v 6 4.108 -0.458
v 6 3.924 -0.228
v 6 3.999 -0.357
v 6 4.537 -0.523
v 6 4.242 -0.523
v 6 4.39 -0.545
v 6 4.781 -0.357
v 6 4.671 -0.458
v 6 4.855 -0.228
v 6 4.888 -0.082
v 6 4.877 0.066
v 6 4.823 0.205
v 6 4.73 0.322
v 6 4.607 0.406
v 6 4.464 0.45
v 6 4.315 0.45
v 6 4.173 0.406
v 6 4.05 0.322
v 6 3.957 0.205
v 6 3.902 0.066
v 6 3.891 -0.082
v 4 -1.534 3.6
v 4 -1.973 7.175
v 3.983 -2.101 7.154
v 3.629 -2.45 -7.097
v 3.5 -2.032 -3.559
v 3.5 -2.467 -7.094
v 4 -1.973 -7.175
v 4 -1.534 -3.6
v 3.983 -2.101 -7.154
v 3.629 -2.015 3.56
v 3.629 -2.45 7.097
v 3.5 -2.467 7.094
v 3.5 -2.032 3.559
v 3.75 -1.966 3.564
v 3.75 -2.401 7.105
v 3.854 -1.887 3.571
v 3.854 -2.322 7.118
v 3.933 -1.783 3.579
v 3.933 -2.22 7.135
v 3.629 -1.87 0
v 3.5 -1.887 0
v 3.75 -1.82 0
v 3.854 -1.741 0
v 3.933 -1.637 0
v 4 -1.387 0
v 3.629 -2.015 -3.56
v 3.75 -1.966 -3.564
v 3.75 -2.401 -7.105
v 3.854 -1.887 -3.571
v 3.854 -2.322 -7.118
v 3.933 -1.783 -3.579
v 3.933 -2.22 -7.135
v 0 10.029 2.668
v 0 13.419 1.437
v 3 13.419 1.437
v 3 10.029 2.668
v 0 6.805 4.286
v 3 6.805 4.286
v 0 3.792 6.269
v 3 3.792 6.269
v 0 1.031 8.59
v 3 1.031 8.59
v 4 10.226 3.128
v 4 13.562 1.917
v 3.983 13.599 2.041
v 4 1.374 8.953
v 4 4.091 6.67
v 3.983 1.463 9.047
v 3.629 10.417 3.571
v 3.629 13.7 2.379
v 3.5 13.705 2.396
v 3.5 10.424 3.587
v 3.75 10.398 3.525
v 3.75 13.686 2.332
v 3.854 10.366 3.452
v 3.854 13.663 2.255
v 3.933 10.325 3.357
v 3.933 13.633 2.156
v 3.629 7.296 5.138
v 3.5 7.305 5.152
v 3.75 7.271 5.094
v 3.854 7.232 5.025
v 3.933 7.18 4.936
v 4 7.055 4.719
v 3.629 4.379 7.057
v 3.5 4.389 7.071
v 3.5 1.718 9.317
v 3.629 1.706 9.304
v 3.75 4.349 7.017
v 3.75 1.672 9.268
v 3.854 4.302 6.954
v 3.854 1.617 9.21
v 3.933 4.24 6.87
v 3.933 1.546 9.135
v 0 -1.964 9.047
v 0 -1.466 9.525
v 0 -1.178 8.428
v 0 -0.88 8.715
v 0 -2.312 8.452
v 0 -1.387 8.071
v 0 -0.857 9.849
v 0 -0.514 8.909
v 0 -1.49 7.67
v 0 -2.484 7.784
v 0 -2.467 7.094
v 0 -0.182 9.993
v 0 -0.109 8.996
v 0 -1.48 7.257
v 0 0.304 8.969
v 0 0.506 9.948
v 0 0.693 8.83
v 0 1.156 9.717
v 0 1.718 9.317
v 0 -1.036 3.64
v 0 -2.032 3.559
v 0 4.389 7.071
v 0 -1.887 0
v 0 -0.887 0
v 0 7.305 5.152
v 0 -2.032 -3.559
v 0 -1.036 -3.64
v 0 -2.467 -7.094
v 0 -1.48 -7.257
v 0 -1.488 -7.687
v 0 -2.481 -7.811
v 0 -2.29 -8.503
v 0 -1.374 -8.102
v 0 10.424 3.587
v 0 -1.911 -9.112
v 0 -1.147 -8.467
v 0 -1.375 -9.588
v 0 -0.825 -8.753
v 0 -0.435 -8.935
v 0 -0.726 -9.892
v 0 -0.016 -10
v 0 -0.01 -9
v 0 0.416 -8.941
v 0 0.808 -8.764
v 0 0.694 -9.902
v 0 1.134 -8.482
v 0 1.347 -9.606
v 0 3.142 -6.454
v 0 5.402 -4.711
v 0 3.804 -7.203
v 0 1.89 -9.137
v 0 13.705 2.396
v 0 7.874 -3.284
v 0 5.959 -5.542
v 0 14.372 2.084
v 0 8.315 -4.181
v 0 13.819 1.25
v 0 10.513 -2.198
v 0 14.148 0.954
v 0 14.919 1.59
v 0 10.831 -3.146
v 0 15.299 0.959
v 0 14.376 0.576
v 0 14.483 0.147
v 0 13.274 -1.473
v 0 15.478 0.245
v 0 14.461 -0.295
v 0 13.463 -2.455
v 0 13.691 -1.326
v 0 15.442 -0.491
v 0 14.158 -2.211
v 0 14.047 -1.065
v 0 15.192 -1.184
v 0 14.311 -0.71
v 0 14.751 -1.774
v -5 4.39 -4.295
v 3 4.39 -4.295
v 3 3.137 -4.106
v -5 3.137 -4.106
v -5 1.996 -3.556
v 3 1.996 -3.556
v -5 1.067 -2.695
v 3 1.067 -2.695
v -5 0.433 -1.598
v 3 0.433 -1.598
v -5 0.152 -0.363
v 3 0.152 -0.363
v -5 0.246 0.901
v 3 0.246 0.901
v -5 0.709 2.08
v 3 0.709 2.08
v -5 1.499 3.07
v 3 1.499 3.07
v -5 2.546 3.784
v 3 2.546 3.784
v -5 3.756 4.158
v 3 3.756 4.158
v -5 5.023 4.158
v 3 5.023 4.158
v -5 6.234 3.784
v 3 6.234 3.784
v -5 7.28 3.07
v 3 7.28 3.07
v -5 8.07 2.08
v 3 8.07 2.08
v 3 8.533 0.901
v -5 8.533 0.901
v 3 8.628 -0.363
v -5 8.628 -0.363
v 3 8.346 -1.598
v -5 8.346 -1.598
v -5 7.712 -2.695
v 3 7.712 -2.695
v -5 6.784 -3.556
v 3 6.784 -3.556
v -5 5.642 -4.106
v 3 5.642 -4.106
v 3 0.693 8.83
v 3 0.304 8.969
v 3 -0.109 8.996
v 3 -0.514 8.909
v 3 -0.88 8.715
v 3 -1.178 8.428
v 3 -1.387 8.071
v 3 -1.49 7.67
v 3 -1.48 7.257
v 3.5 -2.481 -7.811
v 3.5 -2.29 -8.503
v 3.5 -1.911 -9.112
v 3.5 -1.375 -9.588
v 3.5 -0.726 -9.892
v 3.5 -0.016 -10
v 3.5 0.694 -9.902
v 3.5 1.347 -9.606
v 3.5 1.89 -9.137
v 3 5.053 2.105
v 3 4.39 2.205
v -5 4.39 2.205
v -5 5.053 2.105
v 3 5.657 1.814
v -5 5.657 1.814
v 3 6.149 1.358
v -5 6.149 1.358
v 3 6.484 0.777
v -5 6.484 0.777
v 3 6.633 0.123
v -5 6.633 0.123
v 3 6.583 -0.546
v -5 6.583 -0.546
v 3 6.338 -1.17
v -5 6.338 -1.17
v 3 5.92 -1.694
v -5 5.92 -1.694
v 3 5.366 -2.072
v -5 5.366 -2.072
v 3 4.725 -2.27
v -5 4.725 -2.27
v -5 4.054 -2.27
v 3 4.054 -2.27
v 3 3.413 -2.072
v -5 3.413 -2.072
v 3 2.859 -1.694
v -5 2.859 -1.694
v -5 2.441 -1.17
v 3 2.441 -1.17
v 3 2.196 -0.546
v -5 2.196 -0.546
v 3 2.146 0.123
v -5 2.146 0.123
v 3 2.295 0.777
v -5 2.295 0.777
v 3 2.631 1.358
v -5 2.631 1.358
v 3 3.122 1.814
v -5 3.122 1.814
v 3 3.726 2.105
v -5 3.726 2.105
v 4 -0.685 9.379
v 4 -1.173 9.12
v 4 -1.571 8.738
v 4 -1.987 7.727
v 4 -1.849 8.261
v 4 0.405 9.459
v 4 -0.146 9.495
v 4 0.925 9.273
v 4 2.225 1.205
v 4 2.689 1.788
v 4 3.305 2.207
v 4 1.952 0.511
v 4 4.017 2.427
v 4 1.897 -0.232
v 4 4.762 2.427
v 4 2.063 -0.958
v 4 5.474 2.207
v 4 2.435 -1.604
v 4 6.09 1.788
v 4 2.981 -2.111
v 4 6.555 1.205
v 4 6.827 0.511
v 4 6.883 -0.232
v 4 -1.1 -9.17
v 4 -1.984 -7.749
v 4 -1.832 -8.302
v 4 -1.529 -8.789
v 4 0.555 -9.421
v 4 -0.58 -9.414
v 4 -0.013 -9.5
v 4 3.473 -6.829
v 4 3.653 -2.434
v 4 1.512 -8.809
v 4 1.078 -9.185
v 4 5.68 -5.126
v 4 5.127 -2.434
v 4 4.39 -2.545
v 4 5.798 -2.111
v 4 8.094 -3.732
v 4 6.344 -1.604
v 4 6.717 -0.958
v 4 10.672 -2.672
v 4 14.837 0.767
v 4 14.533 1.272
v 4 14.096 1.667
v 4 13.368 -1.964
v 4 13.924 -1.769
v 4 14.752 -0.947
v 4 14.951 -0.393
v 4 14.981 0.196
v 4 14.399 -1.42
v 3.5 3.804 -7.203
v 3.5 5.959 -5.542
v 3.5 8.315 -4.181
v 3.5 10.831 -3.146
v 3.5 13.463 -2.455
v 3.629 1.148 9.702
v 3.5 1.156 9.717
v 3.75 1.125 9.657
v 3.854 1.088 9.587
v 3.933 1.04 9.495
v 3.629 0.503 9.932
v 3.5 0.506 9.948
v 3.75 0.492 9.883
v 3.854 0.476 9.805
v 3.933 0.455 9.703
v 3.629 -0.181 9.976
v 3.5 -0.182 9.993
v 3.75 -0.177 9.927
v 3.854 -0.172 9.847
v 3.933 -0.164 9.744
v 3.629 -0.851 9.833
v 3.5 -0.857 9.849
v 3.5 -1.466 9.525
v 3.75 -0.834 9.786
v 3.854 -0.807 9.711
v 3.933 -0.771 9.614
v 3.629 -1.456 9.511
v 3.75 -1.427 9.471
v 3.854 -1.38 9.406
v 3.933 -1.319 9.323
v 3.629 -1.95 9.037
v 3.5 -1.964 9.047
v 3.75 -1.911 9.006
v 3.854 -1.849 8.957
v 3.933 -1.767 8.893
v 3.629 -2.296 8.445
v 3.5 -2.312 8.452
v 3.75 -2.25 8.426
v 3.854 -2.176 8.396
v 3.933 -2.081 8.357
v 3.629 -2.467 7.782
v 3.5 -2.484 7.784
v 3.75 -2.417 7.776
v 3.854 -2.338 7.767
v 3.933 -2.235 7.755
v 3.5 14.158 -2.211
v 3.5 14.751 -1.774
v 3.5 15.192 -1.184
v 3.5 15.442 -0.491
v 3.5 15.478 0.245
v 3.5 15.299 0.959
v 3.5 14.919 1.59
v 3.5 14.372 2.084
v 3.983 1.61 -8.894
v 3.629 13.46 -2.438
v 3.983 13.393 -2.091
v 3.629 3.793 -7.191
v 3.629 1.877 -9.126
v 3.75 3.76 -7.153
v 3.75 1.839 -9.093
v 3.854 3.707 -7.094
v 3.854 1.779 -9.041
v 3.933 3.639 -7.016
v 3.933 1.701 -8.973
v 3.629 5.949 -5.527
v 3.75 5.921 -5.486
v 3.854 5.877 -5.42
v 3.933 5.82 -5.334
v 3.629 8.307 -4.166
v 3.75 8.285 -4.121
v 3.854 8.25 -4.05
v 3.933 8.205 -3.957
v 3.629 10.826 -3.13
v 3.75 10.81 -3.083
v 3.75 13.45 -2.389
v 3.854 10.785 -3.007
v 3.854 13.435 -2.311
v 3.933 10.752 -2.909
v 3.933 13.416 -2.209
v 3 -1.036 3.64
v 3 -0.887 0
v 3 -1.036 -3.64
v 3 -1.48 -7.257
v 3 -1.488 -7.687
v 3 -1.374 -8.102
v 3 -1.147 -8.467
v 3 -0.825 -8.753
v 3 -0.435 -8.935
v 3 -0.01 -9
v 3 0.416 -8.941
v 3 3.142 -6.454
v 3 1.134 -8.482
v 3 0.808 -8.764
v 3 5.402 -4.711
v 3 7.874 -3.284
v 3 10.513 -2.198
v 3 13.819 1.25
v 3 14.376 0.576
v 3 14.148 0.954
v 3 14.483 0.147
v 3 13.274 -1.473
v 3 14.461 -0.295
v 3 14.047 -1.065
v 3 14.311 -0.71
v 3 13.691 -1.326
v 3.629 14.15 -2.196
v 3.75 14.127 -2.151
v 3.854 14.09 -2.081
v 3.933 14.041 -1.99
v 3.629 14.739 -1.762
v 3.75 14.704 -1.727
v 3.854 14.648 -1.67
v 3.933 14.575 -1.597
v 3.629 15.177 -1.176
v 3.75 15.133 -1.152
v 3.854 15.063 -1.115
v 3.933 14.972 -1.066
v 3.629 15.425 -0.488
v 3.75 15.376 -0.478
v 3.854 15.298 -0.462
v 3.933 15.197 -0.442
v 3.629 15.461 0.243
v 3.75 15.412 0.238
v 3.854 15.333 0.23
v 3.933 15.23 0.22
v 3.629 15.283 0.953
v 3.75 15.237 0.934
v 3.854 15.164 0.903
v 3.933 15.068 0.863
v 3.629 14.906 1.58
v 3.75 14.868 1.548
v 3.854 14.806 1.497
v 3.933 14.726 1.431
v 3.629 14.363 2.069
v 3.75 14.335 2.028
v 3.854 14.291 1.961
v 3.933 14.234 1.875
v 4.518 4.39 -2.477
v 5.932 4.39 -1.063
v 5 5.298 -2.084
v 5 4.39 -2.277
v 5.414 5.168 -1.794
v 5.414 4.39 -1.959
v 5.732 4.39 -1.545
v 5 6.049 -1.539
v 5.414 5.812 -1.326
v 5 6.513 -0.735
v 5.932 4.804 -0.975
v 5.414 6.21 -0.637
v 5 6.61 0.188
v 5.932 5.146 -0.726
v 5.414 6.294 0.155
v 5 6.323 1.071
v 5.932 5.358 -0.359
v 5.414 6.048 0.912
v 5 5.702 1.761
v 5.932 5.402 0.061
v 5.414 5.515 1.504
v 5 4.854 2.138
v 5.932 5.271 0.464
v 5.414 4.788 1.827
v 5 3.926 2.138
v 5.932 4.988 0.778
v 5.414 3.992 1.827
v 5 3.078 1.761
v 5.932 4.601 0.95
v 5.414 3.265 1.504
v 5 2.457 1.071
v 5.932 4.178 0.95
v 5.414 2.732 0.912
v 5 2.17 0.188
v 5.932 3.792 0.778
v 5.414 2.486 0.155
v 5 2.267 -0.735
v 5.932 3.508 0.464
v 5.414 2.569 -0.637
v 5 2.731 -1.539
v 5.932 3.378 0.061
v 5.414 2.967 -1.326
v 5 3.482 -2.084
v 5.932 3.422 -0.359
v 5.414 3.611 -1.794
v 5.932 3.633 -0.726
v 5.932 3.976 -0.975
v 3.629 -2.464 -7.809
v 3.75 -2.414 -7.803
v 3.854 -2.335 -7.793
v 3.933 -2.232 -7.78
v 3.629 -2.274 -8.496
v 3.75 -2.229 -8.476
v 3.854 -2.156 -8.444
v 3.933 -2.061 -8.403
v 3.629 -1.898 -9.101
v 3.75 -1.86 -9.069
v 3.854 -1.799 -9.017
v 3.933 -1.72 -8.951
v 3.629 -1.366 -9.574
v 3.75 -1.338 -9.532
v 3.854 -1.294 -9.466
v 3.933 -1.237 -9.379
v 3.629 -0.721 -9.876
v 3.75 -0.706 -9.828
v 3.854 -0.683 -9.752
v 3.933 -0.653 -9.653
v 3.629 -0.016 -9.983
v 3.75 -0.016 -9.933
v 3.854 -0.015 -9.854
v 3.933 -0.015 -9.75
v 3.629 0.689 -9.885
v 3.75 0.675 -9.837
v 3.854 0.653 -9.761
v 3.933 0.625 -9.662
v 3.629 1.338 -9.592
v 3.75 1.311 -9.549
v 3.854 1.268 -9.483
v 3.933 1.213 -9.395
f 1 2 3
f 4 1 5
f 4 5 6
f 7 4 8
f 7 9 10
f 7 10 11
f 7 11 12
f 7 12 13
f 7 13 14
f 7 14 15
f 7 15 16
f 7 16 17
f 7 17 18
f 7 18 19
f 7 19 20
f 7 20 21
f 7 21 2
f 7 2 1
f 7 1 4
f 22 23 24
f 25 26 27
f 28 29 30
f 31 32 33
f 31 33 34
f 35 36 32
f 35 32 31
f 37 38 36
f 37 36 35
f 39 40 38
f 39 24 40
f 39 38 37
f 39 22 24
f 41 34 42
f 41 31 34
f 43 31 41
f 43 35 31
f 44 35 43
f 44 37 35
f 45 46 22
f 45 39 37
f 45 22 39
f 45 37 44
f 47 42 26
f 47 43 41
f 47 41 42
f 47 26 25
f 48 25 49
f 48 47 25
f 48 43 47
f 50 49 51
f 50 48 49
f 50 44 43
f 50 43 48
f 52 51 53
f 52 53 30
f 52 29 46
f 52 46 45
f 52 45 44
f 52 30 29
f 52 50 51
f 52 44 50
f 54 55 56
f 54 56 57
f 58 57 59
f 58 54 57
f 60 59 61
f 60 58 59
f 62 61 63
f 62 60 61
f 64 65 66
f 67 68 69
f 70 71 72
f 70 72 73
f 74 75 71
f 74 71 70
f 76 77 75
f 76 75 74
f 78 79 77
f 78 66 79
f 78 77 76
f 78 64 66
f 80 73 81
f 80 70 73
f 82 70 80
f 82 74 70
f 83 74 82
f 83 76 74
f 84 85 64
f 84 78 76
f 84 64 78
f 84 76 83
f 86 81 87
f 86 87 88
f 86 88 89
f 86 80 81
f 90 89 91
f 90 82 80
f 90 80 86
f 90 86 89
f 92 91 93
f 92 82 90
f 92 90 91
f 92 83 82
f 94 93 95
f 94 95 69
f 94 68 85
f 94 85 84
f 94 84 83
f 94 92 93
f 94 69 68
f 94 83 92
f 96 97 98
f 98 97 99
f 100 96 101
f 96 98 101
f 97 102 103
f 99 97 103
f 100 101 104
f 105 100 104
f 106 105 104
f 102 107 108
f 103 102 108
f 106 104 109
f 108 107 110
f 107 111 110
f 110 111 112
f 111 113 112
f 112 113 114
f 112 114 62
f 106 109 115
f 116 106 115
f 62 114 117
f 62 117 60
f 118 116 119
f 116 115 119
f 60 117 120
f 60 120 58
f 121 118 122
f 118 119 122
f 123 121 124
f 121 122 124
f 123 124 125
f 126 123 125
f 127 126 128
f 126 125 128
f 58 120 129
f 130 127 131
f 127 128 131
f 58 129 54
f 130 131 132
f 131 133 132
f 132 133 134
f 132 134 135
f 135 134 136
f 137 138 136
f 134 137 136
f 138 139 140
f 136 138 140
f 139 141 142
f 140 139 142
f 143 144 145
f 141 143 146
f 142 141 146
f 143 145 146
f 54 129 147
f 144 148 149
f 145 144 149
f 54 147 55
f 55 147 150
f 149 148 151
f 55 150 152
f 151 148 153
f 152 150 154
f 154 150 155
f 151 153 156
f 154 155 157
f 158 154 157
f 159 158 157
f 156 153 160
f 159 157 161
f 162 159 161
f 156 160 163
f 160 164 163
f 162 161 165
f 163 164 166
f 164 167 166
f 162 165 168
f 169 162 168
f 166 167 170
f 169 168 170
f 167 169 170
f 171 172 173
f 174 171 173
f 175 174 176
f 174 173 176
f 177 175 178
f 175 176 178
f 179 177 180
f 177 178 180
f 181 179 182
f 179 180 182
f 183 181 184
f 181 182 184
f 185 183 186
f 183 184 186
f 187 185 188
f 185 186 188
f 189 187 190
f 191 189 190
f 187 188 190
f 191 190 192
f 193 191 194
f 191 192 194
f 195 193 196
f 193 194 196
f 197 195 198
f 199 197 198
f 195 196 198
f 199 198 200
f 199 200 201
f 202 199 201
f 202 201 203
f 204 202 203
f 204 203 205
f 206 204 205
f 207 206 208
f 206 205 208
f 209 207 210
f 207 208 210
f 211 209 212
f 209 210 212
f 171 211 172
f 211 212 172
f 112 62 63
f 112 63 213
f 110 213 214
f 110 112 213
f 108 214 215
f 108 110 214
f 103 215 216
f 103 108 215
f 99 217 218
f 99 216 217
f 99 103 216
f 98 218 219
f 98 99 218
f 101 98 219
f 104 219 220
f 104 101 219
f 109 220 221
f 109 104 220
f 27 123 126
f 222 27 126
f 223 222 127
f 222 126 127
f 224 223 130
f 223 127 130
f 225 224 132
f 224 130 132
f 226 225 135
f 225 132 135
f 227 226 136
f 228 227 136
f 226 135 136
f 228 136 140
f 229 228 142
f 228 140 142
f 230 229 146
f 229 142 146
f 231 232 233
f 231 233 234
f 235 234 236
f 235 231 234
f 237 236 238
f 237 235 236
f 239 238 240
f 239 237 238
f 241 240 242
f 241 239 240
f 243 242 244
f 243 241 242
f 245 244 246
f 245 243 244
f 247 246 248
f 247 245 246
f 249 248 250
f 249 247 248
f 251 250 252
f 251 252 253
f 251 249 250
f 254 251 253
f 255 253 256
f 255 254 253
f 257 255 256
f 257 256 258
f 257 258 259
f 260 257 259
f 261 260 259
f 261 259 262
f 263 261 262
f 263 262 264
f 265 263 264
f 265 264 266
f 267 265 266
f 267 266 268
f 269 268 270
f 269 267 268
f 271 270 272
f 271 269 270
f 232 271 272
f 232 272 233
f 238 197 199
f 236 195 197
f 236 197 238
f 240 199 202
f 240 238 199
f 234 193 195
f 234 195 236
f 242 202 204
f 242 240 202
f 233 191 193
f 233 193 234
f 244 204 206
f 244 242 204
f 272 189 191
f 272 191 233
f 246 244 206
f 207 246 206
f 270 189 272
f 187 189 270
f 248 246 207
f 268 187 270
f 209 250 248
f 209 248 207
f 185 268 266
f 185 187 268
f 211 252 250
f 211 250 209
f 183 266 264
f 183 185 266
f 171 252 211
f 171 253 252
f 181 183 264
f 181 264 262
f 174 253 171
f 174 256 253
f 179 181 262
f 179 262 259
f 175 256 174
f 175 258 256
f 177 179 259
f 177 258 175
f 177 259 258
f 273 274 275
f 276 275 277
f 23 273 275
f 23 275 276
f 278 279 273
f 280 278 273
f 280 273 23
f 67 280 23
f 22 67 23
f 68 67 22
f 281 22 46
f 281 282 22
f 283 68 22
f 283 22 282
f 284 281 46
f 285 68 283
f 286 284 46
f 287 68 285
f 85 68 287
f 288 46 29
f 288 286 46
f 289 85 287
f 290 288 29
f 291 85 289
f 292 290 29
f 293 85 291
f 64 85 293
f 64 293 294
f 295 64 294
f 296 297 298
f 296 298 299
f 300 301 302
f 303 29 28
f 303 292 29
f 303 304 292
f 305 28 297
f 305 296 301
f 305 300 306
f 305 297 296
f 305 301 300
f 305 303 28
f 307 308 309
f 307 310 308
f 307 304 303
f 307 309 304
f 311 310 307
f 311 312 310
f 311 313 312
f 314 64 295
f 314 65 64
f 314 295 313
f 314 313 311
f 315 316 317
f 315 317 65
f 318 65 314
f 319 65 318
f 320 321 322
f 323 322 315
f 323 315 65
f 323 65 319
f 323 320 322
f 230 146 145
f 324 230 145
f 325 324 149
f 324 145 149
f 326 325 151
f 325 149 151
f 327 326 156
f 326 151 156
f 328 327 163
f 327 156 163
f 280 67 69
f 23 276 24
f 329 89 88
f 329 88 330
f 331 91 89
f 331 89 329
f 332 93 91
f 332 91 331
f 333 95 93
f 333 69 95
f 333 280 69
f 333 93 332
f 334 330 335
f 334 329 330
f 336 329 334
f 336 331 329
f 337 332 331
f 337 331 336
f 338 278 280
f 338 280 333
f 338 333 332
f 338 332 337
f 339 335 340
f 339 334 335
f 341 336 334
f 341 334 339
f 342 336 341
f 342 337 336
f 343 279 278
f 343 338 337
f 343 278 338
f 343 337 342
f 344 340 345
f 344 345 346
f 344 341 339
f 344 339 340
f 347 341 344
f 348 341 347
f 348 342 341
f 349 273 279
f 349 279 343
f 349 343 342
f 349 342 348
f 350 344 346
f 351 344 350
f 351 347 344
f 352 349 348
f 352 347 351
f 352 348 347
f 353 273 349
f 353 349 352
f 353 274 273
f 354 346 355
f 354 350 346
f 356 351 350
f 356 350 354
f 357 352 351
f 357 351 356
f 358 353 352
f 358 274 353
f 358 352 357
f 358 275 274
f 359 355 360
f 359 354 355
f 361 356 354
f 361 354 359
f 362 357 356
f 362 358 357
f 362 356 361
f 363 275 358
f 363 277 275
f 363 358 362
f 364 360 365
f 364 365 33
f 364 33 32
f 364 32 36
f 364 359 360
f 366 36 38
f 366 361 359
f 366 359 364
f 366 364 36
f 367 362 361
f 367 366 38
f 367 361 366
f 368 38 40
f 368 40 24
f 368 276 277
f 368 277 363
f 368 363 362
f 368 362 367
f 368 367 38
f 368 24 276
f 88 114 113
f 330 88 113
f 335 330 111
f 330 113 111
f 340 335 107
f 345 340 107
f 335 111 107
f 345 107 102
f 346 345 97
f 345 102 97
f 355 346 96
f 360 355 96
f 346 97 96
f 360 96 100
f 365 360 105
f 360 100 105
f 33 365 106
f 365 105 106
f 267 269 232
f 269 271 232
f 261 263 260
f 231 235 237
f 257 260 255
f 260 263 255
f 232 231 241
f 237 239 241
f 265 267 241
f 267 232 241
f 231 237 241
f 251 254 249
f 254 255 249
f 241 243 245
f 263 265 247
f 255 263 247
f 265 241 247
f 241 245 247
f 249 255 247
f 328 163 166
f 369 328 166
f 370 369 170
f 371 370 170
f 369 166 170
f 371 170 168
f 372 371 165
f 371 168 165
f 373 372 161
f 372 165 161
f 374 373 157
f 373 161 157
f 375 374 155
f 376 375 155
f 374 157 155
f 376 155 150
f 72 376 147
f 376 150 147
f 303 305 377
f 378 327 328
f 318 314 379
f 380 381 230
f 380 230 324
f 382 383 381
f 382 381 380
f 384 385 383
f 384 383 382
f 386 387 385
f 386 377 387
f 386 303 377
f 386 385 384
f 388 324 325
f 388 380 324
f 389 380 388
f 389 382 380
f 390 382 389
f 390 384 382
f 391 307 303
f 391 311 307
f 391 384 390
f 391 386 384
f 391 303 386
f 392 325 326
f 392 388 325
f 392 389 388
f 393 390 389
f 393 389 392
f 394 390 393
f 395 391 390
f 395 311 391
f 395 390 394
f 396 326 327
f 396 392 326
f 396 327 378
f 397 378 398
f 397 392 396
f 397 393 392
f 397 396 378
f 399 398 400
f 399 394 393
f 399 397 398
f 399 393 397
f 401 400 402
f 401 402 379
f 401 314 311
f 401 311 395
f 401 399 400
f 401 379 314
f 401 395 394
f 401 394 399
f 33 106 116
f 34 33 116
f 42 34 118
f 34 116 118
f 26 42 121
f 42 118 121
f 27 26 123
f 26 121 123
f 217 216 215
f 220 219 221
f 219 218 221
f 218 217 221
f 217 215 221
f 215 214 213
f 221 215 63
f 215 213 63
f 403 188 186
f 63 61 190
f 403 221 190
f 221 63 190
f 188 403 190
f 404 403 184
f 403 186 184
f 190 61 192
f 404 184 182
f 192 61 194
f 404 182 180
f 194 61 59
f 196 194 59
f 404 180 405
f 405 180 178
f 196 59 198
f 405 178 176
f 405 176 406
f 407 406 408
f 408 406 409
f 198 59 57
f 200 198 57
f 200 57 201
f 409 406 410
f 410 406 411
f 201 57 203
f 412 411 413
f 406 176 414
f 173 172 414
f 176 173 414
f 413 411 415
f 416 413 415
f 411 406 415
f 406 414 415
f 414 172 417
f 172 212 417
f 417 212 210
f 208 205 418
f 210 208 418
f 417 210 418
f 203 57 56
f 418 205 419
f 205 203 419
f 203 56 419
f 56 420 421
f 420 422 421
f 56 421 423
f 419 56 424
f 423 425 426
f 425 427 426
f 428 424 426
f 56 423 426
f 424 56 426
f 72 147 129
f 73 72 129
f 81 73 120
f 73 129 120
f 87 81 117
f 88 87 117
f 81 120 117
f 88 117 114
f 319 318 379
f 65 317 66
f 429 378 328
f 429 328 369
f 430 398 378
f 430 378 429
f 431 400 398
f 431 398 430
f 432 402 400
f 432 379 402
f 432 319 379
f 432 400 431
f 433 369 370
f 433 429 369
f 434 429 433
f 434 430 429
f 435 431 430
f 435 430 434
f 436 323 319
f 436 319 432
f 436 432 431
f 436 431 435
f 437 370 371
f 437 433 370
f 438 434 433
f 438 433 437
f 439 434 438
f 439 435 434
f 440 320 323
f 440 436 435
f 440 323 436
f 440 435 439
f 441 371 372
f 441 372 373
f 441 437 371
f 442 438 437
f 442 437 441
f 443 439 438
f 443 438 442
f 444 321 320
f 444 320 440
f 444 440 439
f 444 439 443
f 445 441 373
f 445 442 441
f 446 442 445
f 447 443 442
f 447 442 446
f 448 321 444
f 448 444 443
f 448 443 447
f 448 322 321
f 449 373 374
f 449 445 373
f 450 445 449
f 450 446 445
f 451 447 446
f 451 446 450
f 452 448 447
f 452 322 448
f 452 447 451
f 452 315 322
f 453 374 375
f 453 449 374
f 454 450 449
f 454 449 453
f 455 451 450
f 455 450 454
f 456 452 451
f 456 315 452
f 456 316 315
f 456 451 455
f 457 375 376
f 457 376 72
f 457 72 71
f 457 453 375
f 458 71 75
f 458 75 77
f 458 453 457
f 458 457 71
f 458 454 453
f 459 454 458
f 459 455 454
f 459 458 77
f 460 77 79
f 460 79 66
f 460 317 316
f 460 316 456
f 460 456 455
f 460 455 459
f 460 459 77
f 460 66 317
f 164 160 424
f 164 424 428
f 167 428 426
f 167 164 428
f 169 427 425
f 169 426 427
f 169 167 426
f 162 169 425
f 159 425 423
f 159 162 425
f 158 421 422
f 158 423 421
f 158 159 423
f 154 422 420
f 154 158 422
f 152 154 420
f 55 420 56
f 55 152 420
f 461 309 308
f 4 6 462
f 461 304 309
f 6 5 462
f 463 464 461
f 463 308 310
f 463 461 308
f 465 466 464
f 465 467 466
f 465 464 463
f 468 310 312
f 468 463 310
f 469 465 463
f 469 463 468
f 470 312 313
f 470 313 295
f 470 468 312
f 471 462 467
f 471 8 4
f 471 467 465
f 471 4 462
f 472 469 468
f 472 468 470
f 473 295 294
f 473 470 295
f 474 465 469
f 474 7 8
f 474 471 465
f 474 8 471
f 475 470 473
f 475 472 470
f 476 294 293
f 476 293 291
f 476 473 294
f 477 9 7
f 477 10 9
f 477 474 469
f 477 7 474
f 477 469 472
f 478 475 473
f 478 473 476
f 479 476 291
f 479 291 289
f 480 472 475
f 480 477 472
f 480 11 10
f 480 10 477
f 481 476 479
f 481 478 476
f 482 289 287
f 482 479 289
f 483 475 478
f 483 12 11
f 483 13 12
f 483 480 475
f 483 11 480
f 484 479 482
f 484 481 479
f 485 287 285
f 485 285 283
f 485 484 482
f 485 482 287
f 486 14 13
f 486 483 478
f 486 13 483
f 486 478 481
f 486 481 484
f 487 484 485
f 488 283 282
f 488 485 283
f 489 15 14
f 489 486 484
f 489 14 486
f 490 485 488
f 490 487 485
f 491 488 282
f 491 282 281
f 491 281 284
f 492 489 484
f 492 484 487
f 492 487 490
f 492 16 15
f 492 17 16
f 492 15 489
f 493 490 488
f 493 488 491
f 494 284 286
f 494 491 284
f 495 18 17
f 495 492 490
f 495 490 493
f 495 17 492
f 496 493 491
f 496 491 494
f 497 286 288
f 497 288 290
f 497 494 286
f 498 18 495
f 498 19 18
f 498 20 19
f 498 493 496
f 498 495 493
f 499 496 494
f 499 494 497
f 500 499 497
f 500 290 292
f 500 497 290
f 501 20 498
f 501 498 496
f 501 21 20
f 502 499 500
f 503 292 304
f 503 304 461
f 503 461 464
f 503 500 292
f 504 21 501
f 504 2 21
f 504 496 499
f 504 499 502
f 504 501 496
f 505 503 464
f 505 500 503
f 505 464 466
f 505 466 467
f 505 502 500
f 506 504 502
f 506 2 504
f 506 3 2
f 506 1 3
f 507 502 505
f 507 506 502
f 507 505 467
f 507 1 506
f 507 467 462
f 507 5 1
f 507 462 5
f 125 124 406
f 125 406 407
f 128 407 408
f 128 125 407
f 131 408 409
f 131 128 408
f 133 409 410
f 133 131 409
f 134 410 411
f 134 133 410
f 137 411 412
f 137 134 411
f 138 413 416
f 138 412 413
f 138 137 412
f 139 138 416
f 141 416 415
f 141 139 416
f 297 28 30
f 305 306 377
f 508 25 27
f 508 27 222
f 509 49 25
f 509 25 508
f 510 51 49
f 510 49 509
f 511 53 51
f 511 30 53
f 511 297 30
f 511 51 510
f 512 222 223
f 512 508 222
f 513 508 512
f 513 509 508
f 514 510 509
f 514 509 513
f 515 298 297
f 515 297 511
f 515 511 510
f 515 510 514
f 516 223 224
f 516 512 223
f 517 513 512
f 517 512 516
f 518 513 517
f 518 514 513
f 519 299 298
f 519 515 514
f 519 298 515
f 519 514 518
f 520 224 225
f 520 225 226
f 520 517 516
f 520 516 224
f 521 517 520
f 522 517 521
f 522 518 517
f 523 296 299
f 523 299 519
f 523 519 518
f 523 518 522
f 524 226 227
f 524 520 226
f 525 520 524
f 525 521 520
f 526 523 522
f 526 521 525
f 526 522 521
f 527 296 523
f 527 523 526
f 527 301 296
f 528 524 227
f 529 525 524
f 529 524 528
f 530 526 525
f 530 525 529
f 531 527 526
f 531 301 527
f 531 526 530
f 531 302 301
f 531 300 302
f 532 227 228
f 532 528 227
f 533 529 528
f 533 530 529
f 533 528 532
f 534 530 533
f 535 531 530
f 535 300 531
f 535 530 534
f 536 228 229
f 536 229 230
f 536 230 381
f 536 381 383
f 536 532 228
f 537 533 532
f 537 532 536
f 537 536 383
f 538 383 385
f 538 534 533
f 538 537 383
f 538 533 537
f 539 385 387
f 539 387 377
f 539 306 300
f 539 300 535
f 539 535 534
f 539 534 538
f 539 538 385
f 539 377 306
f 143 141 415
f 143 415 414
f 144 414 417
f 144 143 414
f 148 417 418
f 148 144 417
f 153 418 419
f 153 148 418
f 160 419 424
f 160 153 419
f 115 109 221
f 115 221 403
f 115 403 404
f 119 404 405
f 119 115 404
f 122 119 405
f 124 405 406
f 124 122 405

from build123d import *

# Parameters (mm, degrees)
BOSS_EXTRUDE1_DEPTH = 4
FILLET1_R           = 0.5
SHELL2_T            = -1
SKETCH2_R           = 4.25
SKETCH2_R_2         = 2.25
BOSS_EXTRUDE2_DEPTH = 8
SKETCH3_R           = 2.5
BOSS_EXTRUDE3_DEPTH = 2
FILLET2_R           = 2


with BuildPart() as part:
    # Sketch1 → Boss-Extrude1 (new body)
    with BuildSketch(Plane(origin=(0, 0, 0), x_dir=(0, 0, -1), z_dir=(1, 0, 0))):
        with BuildLine():
            ThreePointArc((2.454932738, 13.462932908), (0.124483772, 15.487279891), (-2.395757596, 13.704765785))
            ThreePointArc((-2.395757596, 13.704765785), (-5.152279099, 7.304796743), (-9.316554121, 1.717594576))
            ThreePointArc((-9.316554121, 1.717594576), (-9.70794679, -1.172591563), (-7.094283556, -2.46685917))
            ThreePointArc((-7.094283556, -2.46685917), (0, -1.887364685), (7.094283556, -2.46685917))
            ThreePointArc((7.094283556, -2.46685917), (9.763595355, -1.061195586), (9.136708277, 1.88975819))
            ThreePointArc((9.136708277, 1.88975819), (4.822059624, 7.114144441), (2.454932738, 13.462932908))
        make_face()
    extrude(amount=BOSS_EXTRUDE1_DEPTH)

    # Fillet1
    fillet1_edges = [part.edges().sort_by_distance(p)[0] for p in [
        (4, -1.887364685, 0),
        (4, -1.061195586, -9.763595355),
        (4, 7.114144441, -4.822059624),
        (4, 15.487279891, -0.124483772),
        (4, 7.304796743, 5.152279099),
        (4, -1.172591563, 9.70794679),
    ]]
    fillet(fillet1_edges, radius=FILLET1_R)

    # Shell2
    shell2_openings = [part.faces().sort_by_distance(p)[0] for p in [
        (0, 4.2016107, 0.088845764),
    ]]
    offset(amount=SHELL2_T, openings=shell2_openings, kind=Kind.INTERSECTION)

    # Sketch2 → Boss-Extrude2 (add)
    with BuildSketch(Plane.ZY.offset(-3)):
        with Locations(Location((-0.044973033, 4.389682089, 0), (0, 0, 180))):
            Circle(SKETCH2_R)
        with Locations((-0.044973033, 4.389682089)):
            Circle(SKETCH2_R_2, mode=Mode.SUBTRACT)
    extrude(amount=BOSS_EXTRUDE2_DEPTH)

    # Sketch3 → Boss-Extrude3 (add)
    with BuildSketch(Plane(origin=(4, 0, 0), x_dir=(0, 0, -1), z_dir=(1, 0, 0))):
        with Locations((0.044973661, 4.389769746)):
            Circle(SKETCH3_R)
    extrude(amount=BOSS_EXTRUDE3_DEPTH)

    # Fillet2
    fillet2_edges = [part.edges().sort_by_distance(p)[0] for p in [
        (6, 4.389769746, 2.455026339),
    ]]
    fillet(fillet2_edges, radius=FILLET2_R - 0.0001)  # a hair under: the kernel refuses the full size


solid = part.part
